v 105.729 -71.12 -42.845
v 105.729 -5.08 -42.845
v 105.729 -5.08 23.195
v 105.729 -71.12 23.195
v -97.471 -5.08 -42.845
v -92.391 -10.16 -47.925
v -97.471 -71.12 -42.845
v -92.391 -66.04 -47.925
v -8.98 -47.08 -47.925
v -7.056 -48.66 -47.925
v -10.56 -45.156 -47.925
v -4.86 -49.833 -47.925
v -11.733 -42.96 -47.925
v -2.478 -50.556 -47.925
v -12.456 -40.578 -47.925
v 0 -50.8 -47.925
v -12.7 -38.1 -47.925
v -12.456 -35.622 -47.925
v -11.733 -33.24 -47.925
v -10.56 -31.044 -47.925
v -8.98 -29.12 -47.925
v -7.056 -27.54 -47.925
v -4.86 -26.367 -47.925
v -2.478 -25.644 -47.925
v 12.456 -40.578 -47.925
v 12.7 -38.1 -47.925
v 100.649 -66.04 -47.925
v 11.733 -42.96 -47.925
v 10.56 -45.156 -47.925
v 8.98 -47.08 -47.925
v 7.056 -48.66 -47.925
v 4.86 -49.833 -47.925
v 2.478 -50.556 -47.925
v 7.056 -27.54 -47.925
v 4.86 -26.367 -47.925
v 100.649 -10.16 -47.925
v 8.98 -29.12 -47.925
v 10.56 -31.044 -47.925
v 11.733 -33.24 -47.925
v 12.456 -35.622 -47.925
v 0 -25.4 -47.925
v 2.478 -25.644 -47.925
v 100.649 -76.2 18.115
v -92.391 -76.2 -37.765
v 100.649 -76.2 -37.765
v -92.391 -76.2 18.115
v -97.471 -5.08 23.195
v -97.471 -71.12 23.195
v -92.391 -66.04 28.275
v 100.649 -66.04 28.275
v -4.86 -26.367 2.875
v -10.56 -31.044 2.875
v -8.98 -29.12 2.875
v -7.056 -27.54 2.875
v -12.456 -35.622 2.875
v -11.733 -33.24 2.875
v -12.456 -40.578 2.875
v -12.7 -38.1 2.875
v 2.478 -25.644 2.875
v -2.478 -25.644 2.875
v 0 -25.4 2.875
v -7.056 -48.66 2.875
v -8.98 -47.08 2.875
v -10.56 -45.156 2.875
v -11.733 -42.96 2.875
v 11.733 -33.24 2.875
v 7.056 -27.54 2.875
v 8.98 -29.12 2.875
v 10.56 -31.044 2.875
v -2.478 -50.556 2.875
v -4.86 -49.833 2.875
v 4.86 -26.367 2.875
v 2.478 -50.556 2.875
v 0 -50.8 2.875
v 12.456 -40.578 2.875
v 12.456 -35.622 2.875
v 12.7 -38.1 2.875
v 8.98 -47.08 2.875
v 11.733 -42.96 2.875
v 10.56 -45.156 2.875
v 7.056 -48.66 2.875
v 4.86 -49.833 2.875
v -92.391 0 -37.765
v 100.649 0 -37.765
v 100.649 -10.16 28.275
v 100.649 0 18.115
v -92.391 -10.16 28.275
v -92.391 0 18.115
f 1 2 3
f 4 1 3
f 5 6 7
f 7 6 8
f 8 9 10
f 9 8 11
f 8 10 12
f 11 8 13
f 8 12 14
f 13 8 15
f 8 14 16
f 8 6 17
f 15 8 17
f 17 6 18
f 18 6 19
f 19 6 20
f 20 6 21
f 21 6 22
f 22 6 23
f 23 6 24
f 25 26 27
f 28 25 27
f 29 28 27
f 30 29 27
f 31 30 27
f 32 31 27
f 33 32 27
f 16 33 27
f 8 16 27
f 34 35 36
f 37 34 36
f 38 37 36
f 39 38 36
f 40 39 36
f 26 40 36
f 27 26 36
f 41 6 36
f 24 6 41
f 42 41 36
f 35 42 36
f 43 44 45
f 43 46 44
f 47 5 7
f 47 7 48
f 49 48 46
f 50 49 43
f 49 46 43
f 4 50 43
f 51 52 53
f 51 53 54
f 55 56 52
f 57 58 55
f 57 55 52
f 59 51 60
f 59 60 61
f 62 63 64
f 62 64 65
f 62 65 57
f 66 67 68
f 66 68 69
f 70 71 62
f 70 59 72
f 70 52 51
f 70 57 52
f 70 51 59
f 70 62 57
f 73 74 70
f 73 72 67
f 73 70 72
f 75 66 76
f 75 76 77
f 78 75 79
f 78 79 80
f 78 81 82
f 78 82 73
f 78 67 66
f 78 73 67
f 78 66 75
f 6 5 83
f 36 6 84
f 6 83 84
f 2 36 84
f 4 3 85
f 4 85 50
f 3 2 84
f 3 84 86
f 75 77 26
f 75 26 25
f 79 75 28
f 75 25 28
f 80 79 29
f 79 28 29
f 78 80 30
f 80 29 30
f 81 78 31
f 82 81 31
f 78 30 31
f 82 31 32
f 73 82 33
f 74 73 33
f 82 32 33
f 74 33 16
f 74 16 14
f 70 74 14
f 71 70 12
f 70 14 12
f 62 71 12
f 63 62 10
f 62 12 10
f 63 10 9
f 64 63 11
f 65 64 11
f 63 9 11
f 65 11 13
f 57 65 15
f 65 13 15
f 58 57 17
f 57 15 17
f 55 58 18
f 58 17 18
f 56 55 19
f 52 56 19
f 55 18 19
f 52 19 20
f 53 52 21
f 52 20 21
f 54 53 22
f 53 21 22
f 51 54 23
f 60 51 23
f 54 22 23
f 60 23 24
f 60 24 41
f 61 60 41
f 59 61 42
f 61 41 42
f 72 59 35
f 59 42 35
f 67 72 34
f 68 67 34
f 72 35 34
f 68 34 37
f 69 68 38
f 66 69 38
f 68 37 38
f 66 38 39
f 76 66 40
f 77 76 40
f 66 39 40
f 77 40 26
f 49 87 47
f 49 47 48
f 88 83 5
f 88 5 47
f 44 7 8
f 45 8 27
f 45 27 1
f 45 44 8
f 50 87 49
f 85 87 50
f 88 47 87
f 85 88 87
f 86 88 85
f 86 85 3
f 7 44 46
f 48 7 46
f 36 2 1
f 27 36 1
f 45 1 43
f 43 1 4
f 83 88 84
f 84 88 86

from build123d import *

# Parameters (mm, degrees)
F0_W     = 203.2
F0_H     = 76.2
F1_DEPTH = 76.2
F2_SIZE  = 10.16
F3_SIZE  = 5.07999
F4_R     = 12.7
F5_DEPTH = 50.8


# Not quite as in the source:
# - a fillet or chamfer is up to 0.001 mm smaller than in the source, because OpenCascade refuses the exact size


with BuildPart() as f1:
    # F0 (on Front) → F1 (new body)
    with BuildSketch(Plane.XZ):
        with Locations((4.1285920888, -9.8249100385)):
            Rectangle(F0_W, F0_H)
    extrude(amount=F1_DEPTH)

    # F2
    f2_edges = [f1.edges().sort_by_distance(p)[0] for p in [
        (4.128592, -76.2, 28.27509),
        (4.128592, -76.2, -47.92491),
        (4.128592, 0, 28.27509),
        (4.128592, 0, -47.92491),
    ]]
    chamfer(f2_edges, length=F2_SIZE)

    # F3 (size 5.08 in the source; OpenCascade refuses exactly that, so slightly less here)
    f3_edges = [f1.edges().sort_by_distance(p)[0] for p in [
        (-97.471408, -38.1, 28.27509),
        (-97.471408, -76.2, -9.82491),
        (-97.471408, -38.1, -47.92491),
        (-97.471408, 0, -9.82491),
        (105.728592, 0, -9.82491),
        (105.728592, -38.1, -47.92491),
        (105.728592, -76.2, -9.82491),
        (105.728592, -38.1, 28.27509),
    ]]
    chamfer(f3_edges, length=F3_SIZE)

    # F4 (on face) → F5 (cut)
    with BuildSketch(Plane(origin=(0, 0, -47.9249100385), x_dir=(1, 0, 0), z_dir=(0, 0, -1))):
        with Locations((0, 38.1)):
            Circle(F4_R)
    extrude(amount=-F5_DEPTH, mode=Mode.SUBTRACT)


solid = f1.part
